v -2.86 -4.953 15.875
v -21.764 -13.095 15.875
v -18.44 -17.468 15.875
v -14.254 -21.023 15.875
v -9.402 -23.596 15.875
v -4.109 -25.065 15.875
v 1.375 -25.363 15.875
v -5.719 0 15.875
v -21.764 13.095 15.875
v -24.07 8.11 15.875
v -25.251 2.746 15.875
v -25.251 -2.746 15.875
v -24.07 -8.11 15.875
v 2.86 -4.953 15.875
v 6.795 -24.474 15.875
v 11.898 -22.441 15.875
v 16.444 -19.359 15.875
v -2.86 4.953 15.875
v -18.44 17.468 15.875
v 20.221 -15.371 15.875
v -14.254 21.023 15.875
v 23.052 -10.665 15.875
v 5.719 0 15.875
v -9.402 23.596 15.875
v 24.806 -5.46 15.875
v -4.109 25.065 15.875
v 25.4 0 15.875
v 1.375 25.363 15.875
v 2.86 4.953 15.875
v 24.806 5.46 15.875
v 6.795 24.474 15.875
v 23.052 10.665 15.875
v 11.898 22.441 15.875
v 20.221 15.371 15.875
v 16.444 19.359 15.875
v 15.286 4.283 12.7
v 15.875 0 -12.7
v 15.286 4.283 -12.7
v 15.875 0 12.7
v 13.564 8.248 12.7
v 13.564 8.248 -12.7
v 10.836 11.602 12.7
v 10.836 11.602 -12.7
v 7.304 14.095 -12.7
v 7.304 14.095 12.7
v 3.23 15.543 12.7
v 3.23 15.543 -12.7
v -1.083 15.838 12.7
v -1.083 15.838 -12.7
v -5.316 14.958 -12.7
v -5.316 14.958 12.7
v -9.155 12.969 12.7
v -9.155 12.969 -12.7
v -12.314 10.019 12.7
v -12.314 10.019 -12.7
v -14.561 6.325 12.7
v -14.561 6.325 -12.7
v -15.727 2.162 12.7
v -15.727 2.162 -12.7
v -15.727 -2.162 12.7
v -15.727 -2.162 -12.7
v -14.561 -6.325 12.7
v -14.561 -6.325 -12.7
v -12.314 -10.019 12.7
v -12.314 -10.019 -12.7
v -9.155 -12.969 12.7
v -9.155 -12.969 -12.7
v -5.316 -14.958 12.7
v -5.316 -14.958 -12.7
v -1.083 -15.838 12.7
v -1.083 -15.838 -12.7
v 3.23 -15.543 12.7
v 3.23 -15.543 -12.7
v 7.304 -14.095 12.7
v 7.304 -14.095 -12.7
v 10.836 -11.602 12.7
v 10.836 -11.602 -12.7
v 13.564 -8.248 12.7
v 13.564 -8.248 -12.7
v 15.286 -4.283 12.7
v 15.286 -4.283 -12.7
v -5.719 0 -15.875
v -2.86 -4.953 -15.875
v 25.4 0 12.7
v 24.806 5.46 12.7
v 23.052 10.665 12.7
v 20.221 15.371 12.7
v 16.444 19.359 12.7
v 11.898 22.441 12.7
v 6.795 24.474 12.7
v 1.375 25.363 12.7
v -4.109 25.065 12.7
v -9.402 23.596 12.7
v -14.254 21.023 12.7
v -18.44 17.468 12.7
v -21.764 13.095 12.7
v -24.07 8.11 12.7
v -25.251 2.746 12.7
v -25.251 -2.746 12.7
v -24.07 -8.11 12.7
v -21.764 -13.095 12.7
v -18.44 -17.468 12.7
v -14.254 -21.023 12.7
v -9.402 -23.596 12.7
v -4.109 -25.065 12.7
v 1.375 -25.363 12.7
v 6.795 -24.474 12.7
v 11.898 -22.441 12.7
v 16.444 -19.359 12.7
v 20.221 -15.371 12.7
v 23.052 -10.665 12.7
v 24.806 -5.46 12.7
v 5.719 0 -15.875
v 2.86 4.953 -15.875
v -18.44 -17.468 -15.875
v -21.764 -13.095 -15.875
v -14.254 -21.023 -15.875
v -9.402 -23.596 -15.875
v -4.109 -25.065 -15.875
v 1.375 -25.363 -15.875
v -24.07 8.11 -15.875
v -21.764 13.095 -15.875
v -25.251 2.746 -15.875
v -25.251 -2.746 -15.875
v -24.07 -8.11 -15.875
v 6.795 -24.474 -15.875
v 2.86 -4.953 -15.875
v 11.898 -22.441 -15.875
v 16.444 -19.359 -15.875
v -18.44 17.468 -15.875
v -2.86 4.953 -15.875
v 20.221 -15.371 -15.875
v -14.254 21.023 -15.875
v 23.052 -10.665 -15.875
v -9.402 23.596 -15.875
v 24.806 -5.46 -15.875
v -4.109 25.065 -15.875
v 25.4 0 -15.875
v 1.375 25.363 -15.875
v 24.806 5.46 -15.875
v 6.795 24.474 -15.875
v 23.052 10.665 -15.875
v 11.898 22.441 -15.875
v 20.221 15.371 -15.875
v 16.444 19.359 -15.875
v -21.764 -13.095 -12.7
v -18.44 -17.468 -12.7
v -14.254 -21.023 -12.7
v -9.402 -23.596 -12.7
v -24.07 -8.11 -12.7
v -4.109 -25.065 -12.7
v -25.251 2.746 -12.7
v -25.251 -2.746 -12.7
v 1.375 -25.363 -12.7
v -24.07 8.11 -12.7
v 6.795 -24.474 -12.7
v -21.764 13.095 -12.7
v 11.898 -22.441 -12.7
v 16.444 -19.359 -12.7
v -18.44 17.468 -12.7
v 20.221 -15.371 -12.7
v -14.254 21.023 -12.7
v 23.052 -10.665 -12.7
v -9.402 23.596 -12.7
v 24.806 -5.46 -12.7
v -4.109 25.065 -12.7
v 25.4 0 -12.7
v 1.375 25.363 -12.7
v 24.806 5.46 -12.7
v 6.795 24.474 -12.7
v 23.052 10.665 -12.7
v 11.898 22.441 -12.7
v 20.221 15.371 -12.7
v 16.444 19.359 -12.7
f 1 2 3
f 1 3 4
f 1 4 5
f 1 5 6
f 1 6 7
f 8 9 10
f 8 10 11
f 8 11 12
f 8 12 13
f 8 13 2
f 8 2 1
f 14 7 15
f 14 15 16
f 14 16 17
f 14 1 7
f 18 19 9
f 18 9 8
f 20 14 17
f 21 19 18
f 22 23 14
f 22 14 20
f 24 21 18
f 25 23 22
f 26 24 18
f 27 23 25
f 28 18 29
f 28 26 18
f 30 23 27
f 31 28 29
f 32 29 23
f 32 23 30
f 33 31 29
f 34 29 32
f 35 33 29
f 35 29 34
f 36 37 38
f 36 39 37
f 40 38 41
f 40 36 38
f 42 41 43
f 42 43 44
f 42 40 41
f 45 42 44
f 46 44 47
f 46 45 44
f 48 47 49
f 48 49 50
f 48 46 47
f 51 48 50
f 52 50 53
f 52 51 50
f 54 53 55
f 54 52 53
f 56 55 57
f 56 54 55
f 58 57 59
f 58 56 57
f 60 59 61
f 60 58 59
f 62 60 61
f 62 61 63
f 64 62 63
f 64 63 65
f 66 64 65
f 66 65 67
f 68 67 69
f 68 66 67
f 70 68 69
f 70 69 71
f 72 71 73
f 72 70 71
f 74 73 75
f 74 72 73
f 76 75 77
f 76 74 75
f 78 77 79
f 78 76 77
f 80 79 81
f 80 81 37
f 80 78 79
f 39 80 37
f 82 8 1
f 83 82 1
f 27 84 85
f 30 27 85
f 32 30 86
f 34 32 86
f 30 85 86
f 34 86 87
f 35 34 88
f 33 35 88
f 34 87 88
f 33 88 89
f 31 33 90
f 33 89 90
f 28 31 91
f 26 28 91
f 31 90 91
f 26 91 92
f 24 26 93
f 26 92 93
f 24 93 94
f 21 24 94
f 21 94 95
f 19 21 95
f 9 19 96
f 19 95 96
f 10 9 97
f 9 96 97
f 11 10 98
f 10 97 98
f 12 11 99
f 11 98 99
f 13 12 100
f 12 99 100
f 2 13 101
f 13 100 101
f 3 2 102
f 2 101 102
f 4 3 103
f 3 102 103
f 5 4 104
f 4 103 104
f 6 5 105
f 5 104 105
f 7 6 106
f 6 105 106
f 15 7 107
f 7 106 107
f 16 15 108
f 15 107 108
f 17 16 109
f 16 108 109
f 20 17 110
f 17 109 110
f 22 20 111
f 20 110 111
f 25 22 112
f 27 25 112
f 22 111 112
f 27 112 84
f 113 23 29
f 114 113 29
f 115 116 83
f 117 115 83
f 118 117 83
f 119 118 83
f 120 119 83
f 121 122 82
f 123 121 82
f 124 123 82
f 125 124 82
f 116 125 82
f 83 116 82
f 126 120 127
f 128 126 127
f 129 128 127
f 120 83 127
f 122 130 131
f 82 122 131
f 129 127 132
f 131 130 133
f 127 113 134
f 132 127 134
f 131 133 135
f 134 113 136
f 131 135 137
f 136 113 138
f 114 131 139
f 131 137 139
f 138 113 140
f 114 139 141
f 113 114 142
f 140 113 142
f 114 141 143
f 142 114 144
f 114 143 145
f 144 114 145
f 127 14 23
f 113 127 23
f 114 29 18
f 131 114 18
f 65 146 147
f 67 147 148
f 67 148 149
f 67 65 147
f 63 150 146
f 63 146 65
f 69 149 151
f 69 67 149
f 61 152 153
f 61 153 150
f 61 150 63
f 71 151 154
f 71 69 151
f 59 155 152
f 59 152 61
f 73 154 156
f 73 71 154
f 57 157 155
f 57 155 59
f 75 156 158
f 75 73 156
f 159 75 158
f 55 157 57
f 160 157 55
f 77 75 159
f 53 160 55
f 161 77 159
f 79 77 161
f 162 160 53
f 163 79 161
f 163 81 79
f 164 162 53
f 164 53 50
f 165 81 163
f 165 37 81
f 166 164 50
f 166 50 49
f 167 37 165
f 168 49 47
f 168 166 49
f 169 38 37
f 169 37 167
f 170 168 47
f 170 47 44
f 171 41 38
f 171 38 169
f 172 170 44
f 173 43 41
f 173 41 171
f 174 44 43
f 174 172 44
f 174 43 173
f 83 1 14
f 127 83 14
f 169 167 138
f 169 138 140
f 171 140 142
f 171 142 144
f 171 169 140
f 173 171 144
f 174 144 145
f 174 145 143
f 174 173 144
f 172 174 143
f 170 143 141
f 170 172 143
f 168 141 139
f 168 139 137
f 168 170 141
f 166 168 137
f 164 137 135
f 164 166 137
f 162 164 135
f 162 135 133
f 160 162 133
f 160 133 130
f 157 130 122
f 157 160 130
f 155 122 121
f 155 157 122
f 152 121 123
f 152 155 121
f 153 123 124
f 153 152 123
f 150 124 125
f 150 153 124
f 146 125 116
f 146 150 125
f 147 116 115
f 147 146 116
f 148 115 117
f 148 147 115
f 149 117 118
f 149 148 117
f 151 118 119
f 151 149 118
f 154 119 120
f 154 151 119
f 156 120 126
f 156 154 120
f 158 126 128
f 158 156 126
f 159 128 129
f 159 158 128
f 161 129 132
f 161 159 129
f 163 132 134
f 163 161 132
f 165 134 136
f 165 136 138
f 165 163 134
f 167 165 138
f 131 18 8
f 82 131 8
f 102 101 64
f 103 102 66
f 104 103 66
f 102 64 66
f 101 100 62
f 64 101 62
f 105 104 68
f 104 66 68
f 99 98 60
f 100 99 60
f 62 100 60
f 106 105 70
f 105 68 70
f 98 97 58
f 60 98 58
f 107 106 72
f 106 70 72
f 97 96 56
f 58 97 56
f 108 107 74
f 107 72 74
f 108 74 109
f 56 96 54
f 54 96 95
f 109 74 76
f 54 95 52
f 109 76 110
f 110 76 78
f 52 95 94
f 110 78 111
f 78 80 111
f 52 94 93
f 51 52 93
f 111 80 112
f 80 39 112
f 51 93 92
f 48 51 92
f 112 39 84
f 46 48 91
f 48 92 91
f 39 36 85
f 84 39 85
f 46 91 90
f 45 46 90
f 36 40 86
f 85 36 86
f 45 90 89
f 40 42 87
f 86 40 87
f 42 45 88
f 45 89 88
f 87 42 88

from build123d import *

# Parameters (mm, degrees)
SKETCH1_R        = 15.875
DRUM_DEPTH       = 12.7
SKETCH3_R        = 25.4
FLANGE_DEPTH     = 3.175
ATTACHMENT_DEPTH = 48.941448664


with BuildPart() as part:
    # Sketch1 → Drum (new, symmetric)
    with BuildSketch(Plane.XY):
        Circle(SKETCH1_R)
    extrude(amount=DRUM_DEPTH, both=True)

    # Sketch3 → Flange (add)
    with BuildSketch(Plane.XY.offset(12.7)):
        Circle(SKETCH3_R)
    flange = extrude(amount=FLANGE_DEPTH)

    # Flange2: Flange across plane
    add(flange.mirror(Plane.XY))

    # Sketch4 → Attachment (cut, through all)
    with BuildSketch(Plane.XY.offset(15.875)):
        Polygon((5.719231767, 0), (2.859615883, 4.953), (-2.859615883, 4.953), (-5.719231767, 0), (-2.859615883, -4.953), (2.859615883, -4.953), align=None)
    extrude(amount=-ATTACHMENT_DEPTH, mode=Mode.SUBTRACT)


solid = part.part
